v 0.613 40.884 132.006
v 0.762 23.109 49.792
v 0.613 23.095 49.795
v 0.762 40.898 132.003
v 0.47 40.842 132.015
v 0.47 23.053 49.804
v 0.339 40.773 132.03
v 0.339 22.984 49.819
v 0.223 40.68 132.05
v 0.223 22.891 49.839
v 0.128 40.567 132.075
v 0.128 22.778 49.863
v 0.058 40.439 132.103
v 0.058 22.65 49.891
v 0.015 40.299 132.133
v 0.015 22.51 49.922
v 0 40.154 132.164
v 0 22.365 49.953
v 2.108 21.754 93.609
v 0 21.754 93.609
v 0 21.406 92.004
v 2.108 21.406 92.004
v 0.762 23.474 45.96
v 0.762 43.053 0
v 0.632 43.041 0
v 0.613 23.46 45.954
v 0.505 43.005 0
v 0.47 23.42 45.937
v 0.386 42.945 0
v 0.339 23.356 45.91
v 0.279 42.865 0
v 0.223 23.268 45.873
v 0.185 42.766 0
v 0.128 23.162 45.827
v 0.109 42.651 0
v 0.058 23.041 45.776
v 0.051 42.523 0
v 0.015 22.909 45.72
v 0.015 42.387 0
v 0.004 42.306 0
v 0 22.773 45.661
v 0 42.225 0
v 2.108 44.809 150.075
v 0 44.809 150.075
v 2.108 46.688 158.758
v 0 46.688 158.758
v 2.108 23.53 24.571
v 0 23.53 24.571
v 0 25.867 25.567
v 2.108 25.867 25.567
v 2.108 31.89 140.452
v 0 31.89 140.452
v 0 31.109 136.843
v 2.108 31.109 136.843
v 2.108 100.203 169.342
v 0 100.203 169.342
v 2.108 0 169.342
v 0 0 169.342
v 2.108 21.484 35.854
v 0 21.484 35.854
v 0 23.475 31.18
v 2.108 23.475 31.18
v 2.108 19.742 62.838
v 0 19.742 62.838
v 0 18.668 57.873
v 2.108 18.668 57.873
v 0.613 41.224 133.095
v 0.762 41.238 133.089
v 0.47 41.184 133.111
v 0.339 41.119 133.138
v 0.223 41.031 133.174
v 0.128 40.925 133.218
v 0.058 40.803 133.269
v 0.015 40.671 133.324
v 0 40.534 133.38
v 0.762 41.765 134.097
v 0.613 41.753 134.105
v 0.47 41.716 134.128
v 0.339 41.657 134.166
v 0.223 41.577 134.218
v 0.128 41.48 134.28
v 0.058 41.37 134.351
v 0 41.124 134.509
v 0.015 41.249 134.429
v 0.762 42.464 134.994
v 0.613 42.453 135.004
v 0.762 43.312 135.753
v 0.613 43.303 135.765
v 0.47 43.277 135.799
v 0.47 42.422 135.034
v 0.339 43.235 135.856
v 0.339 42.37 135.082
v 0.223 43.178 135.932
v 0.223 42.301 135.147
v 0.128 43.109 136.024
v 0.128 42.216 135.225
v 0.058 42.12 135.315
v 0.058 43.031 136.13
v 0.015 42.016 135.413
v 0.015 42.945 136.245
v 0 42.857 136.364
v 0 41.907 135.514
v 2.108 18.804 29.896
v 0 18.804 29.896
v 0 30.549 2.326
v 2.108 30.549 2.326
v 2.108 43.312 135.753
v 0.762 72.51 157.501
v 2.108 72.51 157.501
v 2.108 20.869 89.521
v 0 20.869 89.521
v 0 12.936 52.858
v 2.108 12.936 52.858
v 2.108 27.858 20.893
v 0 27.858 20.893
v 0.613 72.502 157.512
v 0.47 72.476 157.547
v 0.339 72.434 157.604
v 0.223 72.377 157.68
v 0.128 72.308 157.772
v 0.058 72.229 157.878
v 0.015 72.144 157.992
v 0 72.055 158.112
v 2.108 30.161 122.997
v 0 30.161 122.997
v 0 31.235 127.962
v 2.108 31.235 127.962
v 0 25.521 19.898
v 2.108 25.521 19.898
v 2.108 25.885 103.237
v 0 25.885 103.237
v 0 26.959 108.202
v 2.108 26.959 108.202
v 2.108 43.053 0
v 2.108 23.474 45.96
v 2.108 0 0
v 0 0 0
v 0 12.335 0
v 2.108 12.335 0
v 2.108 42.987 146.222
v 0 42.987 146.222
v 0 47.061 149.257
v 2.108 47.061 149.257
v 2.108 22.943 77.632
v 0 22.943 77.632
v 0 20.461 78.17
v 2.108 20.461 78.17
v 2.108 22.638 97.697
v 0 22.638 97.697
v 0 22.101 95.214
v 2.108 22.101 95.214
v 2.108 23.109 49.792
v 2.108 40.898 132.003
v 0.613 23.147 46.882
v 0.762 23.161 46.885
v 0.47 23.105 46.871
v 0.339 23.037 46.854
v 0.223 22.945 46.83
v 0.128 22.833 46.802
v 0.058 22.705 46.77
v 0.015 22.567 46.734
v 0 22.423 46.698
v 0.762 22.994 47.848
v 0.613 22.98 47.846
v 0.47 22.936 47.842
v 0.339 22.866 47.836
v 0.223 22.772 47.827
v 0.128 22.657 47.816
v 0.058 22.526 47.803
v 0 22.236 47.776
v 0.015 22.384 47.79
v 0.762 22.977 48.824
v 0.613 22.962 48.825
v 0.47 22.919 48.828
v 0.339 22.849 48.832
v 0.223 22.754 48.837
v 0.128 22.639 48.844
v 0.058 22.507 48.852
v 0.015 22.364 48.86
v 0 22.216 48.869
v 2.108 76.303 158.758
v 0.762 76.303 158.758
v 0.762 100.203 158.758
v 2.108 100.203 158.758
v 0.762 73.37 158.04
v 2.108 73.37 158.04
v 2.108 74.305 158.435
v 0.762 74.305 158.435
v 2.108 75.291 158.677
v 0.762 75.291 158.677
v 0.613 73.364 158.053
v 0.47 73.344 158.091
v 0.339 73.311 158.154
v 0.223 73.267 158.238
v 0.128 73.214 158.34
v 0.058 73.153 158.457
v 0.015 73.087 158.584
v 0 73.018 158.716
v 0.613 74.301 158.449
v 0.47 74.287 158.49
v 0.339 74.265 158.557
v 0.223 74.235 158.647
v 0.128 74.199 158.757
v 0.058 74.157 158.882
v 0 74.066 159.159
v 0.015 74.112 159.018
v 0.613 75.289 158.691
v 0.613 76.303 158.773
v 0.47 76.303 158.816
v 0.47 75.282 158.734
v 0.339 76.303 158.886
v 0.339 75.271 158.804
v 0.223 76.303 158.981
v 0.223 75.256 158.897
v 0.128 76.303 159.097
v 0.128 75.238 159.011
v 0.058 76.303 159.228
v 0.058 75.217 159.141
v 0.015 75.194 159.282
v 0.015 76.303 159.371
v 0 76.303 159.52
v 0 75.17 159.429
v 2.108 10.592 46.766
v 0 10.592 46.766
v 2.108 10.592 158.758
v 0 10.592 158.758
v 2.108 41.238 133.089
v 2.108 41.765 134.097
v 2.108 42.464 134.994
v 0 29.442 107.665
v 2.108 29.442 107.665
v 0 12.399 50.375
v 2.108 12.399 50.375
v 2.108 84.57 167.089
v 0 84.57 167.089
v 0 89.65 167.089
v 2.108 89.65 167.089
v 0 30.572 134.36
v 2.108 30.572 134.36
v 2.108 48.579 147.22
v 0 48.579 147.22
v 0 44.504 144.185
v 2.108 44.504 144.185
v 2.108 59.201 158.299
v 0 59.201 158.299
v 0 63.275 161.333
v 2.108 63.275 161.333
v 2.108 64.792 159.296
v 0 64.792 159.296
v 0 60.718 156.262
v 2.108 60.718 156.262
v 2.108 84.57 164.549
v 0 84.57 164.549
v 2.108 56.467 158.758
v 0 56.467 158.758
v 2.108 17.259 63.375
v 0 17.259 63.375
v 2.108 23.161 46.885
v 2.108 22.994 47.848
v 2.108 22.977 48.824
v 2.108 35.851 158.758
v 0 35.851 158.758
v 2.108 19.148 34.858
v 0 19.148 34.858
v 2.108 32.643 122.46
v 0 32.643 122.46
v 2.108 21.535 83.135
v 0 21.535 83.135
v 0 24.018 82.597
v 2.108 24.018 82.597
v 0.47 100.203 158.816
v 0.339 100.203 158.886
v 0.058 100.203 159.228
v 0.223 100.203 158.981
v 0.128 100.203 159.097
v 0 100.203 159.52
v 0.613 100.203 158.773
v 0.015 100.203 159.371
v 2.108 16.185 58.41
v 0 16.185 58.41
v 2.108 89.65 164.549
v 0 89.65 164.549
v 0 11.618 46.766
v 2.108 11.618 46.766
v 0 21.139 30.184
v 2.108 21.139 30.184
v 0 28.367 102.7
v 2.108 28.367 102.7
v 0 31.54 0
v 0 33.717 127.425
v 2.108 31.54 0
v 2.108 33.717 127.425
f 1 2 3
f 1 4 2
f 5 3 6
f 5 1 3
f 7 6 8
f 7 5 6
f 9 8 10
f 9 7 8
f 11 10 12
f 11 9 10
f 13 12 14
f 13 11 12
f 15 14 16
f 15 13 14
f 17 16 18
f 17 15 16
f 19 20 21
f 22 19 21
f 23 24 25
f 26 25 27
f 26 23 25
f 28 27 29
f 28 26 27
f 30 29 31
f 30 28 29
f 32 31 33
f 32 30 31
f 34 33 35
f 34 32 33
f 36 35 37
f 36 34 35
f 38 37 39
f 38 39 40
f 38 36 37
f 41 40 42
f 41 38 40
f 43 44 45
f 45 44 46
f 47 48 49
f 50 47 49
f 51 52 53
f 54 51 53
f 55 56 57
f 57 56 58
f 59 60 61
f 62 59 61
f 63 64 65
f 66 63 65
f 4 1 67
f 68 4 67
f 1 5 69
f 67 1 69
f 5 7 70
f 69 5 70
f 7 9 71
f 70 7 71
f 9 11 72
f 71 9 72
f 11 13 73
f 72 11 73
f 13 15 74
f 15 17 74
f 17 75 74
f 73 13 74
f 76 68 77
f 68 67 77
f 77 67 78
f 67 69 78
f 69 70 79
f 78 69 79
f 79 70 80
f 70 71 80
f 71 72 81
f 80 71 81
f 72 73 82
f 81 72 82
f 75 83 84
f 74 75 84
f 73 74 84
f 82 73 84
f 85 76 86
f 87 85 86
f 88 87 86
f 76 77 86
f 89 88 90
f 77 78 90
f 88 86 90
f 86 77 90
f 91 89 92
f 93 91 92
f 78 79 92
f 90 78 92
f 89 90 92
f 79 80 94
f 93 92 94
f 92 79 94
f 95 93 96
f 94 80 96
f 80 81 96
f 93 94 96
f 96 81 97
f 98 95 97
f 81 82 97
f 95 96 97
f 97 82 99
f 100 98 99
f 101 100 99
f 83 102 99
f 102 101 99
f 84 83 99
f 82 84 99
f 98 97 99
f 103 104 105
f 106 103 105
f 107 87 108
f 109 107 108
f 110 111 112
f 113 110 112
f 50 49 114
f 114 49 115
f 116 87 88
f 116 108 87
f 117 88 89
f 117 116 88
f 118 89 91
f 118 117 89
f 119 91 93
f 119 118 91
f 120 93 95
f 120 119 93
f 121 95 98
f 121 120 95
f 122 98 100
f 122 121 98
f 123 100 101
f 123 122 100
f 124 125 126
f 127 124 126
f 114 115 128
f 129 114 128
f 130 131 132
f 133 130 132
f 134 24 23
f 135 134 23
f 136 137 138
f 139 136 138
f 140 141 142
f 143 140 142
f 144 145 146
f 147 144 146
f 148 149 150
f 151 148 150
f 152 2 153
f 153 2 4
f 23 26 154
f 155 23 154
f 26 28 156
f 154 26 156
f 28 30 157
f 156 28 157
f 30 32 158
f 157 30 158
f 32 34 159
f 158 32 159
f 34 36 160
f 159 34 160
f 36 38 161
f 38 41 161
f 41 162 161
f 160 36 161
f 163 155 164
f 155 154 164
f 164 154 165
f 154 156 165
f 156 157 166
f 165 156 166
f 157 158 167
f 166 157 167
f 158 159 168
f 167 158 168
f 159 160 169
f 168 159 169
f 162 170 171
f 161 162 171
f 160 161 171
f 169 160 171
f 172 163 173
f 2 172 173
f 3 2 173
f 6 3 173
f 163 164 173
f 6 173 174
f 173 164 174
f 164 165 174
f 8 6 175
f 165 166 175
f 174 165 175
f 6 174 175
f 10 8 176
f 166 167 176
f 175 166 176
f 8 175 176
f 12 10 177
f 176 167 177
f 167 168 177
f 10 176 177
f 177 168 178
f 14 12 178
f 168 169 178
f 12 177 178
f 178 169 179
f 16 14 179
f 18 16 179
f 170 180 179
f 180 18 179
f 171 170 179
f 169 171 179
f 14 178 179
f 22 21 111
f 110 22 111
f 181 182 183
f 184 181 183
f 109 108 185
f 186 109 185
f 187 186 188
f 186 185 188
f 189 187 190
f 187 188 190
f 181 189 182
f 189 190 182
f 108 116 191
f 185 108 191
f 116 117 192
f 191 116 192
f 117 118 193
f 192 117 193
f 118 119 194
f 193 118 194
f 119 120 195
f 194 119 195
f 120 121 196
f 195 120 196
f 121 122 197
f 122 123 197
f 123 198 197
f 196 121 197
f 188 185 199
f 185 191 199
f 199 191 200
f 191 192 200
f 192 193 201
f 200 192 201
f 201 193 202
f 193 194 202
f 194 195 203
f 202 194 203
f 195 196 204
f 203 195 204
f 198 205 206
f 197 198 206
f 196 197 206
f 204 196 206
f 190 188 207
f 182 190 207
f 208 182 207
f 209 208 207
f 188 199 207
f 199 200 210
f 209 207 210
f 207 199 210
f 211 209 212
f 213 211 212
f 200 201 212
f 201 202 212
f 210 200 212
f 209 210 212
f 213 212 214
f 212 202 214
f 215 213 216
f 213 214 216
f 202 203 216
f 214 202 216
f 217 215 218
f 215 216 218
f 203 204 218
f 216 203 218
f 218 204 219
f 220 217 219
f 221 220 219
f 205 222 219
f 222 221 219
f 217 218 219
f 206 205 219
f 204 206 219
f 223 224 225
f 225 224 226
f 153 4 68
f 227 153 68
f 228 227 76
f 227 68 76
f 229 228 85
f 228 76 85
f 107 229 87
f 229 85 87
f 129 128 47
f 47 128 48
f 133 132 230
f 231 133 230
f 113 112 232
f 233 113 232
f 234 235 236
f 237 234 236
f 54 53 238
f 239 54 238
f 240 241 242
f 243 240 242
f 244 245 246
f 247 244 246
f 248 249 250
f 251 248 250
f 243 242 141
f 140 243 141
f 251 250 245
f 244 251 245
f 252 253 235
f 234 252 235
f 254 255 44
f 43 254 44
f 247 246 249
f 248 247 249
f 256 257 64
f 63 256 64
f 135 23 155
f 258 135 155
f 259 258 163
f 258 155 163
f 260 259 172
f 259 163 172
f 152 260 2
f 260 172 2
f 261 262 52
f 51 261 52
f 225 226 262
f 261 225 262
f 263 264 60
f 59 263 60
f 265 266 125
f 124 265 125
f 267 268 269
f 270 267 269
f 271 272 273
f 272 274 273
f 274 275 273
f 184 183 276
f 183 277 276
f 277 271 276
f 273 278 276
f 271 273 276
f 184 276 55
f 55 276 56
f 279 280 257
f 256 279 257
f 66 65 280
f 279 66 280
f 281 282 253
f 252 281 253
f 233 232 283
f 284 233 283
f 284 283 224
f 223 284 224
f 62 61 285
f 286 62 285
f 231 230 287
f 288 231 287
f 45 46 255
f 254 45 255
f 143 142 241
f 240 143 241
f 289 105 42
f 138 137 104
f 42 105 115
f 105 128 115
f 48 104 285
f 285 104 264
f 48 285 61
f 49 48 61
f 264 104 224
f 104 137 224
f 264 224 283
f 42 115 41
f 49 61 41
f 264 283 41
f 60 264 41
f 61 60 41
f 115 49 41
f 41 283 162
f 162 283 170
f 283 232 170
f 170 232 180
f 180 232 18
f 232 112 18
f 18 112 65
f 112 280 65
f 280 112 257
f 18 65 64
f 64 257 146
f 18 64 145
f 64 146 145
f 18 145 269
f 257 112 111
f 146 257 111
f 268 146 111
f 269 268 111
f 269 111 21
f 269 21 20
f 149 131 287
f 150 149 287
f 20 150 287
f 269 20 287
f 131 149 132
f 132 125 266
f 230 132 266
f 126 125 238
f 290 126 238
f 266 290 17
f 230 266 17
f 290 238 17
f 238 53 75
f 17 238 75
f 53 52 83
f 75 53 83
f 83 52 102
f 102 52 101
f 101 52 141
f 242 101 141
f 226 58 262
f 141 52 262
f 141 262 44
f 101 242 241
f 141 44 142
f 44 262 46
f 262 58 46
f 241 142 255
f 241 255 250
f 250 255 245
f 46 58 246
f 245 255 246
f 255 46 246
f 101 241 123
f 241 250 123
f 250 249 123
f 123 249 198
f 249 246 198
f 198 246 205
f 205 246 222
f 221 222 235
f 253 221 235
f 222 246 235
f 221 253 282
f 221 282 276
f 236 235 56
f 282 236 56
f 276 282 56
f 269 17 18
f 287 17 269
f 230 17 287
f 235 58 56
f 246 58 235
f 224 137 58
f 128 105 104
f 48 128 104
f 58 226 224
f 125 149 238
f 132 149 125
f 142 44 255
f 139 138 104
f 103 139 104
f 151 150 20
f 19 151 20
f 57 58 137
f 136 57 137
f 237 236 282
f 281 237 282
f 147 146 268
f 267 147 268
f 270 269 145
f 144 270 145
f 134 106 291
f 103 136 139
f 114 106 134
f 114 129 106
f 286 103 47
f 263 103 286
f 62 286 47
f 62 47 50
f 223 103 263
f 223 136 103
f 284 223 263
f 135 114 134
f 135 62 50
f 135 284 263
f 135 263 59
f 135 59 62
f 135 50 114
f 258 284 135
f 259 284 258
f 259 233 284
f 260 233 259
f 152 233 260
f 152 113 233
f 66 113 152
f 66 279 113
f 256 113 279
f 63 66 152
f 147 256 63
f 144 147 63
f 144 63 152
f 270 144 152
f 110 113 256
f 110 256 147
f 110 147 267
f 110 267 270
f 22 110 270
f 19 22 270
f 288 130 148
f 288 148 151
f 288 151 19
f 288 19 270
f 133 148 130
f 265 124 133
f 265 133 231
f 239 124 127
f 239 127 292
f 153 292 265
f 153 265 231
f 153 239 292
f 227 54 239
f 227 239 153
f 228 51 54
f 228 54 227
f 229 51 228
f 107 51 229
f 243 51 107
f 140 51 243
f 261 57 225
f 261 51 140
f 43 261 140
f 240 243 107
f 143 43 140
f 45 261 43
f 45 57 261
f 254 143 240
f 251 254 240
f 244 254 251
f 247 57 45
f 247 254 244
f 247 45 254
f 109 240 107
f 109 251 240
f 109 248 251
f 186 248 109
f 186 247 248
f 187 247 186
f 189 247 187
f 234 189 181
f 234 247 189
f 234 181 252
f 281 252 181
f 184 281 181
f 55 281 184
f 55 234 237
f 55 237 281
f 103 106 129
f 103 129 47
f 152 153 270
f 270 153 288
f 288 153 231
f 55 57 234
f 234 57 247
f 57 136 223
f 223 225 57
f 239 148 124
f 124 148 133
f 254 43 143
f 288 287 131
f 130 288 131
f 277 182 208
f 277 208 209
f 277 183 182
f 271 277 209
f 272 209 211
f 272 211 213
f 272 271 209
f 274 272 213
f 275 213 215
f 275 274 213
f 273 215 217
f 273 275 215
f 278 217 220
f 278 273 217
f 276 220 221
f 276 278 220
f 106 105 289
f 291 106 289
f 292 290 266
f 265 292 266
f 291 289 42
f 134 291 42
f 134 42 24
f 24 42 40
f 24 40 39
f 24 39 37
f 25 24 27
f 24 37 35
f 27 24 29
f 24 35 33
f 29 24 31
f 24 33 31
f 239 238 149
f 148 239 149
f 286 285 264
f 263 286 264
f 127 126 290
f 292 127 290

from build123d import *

# Parameters (mm, degrees)
F0_W     = 5.08
F0_H     = 2.54
F1_DEPTH = 2.1082
F2_R     = 0.762


with BuildPart() as f1:
    # F0 (on Right) → F1 (new body)
    with BuildSketch(Plane.YZ):
        with BuildLine():
            Line((0, 162.0091375), (0, 0))
            Line((0, 0), (12.335197777, 0))
            Line((12.335197777, 0), (18.8042013144, 29.896105485))
            Line((18.8042013144, 29.896105485), (30.5493542935, 2.3257501254))
            Line((30.5493542935, 2.3257501254), (31.5401391658, 0))
            Line((31.5401391658, 0), (31.5707651968, 0))
            Line((31.5707651968, 0), (40.8442968098, 0))
            Line((40.8442968098, 0), (20.5594925834, 47.616175108))
            Line((20.5594925834, 47.616175108), (39.5771112022, 135.5049402038))
            Line((39.5771112022, 135.5049402038), (73.5248959406, 160.7899383022))
            Line((73.5248959406, 160.7899383022), (100.203, 160.7899383022))
            Line((100.203, 160.7899383022), (100.203, 162.0091375))
            Line((100.203, 162.0091375), (82.1398573303, 162.0091375))
            ThreePointArc((82.1398573303, 162.0091375), (80.3438061061, 162.7530862758), (79.5998573303, 164.5491375))
            Line((79.5998573303, 164.5491375), (79.5998573303, 169.3418))
            Line((79.5998573303, 169.3418), (70.6874244764, 169.3418))
            Line((70.6874244764, 169.3418), (70.6874244764, 165.8480664454))
            Line((70.6874244764, 165.8480664454), (70.6874244764, 164.5491375))
            ThreePointArc((70.6874244764, 164.5491375), (70.0510915867, 162.8675752701), (68.4609272063, 162.0285589874))
            ThreePointArc((68.4609272063, 162.0285589874), (68.3044763435, 162.0139975214), (68.1474244764, 162.0091375))
            Line((68.1474244764, 162.0091375), (0, 162.0091375))
        make_face()
        Polygon((21.4843682503, 35.8535070154), (23.4753466245, 31.1799211209), (21.1385536773, 30.1844319338), (19.147575303, 34.8580178283), align=None, mode=Mode.SUBTRACT)
        Polygon((25.8665425285, 25.5668719827), (27.8575209028, 20.8932860882), (25.5207279555, 19.8977969011), (23.5297495813, 24.5713827956), align=None, mode=Mode.SUBTRACT)
        with BuildLine():
            Line((12.3986134924, 50.3752630702), (11.6175919588, 46.7658196656))
            Line((11.6175919588, 46.7658196656), (10.5918, 46.7658196656))
            Line((10.5918, 46.7658196656), (10.5918, 158.7579375))
            Line((10.5918, 158.7579375), (35.8507619547, 158.7579375))
            Line((35.8507619547, 158.7579375), (31.8897708968, 140.4524587956))
            Line((31.8897708968, 140.4524587956), (31.1087493632, 136.8430153909))
            Line((31.1087493632, 136.8430153909), (35.5475592049, 135.882533211))
            ThreePointArc((35.5475592049, 135.882533211), (37.1456481821, 134.7755682604), (37.4929253116, 132.8628062845))
            Line((37.4929253116, 132.8628062845), (29.5595533377, 96.1992113407))
            ThreePointArc((29.5595533377, 96.1992113407), (28.452588387, 94.6011223635), (26.5398264112, 94.2538452339))
            Line((26.5398264112, 94.2538452339), (22.1010165695, 95.2143274138))
            Line((22.1010165695, 95.2143274138), (21.7536814278, 93.6091392306))
            Line((21.7536814278, 93.6091392306), (21.4063462861, 92.0039510473))
            Line((21.4063462861, 92.0039510473), (25.8451561277, 91.0434688674))
            ThreePointArc((25.8451561277, 91.0434688674), (27.4432451049, 89.9365039168), (27.7905222345, 88.0237419409))
            Line((27.7905222345, 88.0237419409), (19.8571502605, 51.3601469971))
            ThreePointArc((19.8571502605, 51.3601469971), (18.7501853099, 49.7620580199), (16.837423334, 49.4147808903))
            Line((16.837423334, 49.4147808903), (12.3986134924, 50.3752630702))
        make_face(mode=Mode.SUBTRACT)
        Polygon((47.0613097153, 149.2568137468), (48.5785484084, 147.2197602993), (44.5044415132, 144.1852829132), (42.9872028202, 146.2223363607), align=None, mode=Mode.SUBTRACT)
        Polygon((44.8088104432, 150.074821282), (46.6876875952, 158.7579375), (56.4668125154, 158.7579375), align=None, mode=Mode.SUBTRACT)
        Polygon((63.2751536106, 161.3332132886), (64.7923923036, 159.296159841), (60.7182854085, 156.2616824549), (59.2010467154, 158.2987359025), align=None, mode=Mode.SUBTRACT)
        with BuildLine():
            Line((0, 164.5491375), (0, 162.0091375))
            Line((0, 162.0091375), (68.1474244764, 162.0091375))
            ThreePointArc((68.1474244764, 162.0091375), (68.3044763435, 162.0139975214), (68.4609272063, 162.0285589874))
            Line((68.4609272063, 162.0285589874), (69.6856973646, 162.9407926238))
            Line((69.6856973646, 162.9407926238), (68.1474244764, 165.0060867035))
            Line((68.1474244764, 165.0060867035), (68.1474244764, 164.5491375))
            Line((68.1474244764, 164.5491375), (55.1748093832, 164.5491375))
            Line((55.1748093832, 164.5491375), (50.0948093832, 164.5491375))
            Line((50.0948093832, 164.5491375), (10.3999171089, 164.5491375))
            Line((10.3999171089, 164.5491375), (5.3199171089, 164.5491375))
            Line((5.3199171089, 164.5491375), (0, 164.5491375))
        make_face()
        Polygon((0, 169.3418), (0, 164.5491375), (5.3199171089, 164.5491375), (5.3199171089, 167.0891375), (10.3999171089, 167.0891375), (10.3999171089, 164.5491375), (50.0948093832, 164.5491375), (50.0948093832, 167.0891375), (55.1748093832, 167.0891375), (55.1748093832, 164.5491375), (68.1474244764, 164.5491375), (68.1474244764, 165.0060867035), (68.1474244764, 169.3418), align=None)
        with Locations((7.8599171089, 165.8191375)):
            Rectangle(F0_W, F0_H)
        with BuildLine():
            Line((69.6856973646, 162.9407926238), (68.4609272063, 162.0285589874))
            ThreePointArc((68.4609272063, 162.0285589874), (70.0510915867, 162.8675752701), (70.6874244764, 164.5491375))
            Line((70.6874244764, 164.5491375), (70.6874244764, 165.8480664454))
            Line((70.6874244764, 165.8480664454), (70.6874244764, 169.3418))
            Line((70.6874244764, 169.3418), (68.1474244764, 169.3418))
            Line((68.1474244764, 169.3418), (68.1474244764, 165.0060867035))
            Line((68.1474244764, 165.0060867035), (69.6856973646, 162.9407926238))
        make_face()
        with Locations((52.6348093832, 165.8191375)):
            Rectangle(F0_W, F0_H)
        with BuildLine():
            Line((20.5594925834, 47.616175108), (40.8442968098, 0))
            Line((40.8442968098, 0), (43.053, 0))
            Line((43.053, 0), (23.4736756901, 45.9601445708))
            ThreePointArc((23.4736756901, 45.9601445708), (22.9941781878, 47.847708452), (23.1092917667, 49.7918185633))
            Line((23.1092917667, 49.7918185633), (40.8984089502, 132.0031391675))
            ThreePointArc((40.8984089502, 132.0031391675), (41.765080018, 134.0967787378), (43.3116785091, 135.7528217618))
            Line((43.3116785091, 135.7528217618), (72.5103326221, 157.500571119))
            ThreePointArc((72.5103326221, 157.500571119), (74.3053957564, 158.4354047741), (76.3034293547, 158.7579375))
            Line((76.3034293547, 158.7579375), (100.203, 158.7579375))
            Line((100.203, 158.7579375), (100.203, 160.7899383022))
            Line((100.203, 160.7899383022), (73.5248959406, 160.7899383022))
            Line((73.5248959406, 160.7899383022), (39.5771112022, 135.5049402038))
            Line((39.5771112022, 135.5049402038), (20.5594925834, 47.616175108))
        make_face()
        with BuildLine():
            Line((82.1398573303, 169.3418), (79.5998573303, 169.3418))
            Line((79.5998573303, 169.3418), (79.5998573303, 164.5491375))
            ThreePointArc((79.5998573303, 164.5491375), (80.3438061061, 162.7530862758), (82.1398573303, 162.0091375))
            Line((82.1398573303, 162.0091375), (100.203, 162.0091375))
            Line((100.203, 162.0091375), (100.203, 164.5491375))
            Line((100.203, 164.5491375), (89.6502663064, 164.5491375))
            Line((89.6502663064, 164.5491375), (84.5702663064, 164.5491375))
            Line((84.5702663064, 164.5491375), (82.1398573303, 164.5491375))
            Line((82.1398573303, 164.5491375), (82.1398573303, 169.3418))
        make_face()
        Polygon((100.203, 169.3418), (82.1398573303, 169.3418), (82.1398573303, 164.5491375), (84.5702663064, 164.5491375), (84.5702663064, 167.0891375), (89.6502663064, 167.0891375), (89.6502663064, 164.5491375), (100.203, 164.5491375), align=None)
        with BuildLine():
            Line((12.9357939022, 52.8578095868), (12.3986134924, 50.3752630702))
            Line((12.3986134924, 50.3752630702), (16.837423334, 49.4147808903))
            ThreePointArc((16.837423334, 49.4147808903), (18.7501853099, 49.7620580199), (19.8571502605, 51.3601469971))
            Line((19.8571502605, 51.3601469971), (27.7905222345, 88.0237419409))
            ThreePointArc((27.7905222345, 88.0237419409), (27.4432451049, 89.9365039168), (25.8451561277, 91.0434688674))
            Line((25.8451561277, 91.0434688674), (21.4063462861, 92.0039510473))
            Line((21.4063462861, 92.0039510473), (20.8691658762, 89.5214045307))
            Line((20.8691658762, 89.5214045307), (25.3079757178, 88.5609223508))
            Line((25.3079757178, 88.5609223508), (24.0175885553, 82.5974767434))
            Line((24.0175885553, 82.5974767434), (22.9432277355, 77.6323837102))
            Line((22.9432277355, 77.6323837102), (19.7419229759, 62.8377489213))
            Line((19.7419229759, 62.8377489213), (18.6675621562, 57.872655888))
            Line((18.6675621562, 57.872655888), (17.3746037439, 51.8973274069))
            Line((17.3746037439, 51.8973274069), (12.9357939022, 52.8578095868))
        make_face()
        Polygon((20.8691658762, 89.5214045307), (12.9357939022, 52.8578095868), (17.3746037439, 51.8973274069), (18.6675621562, 57.872655888), (16.1850156395, 58.4098362979), (17.2593764593, 63.3749293312), (19.7419229759, 62.8377489213), (22.9432277355, 77.6323837102), (20.4606812189, 78.16956412), (21.5350420386, 83.1346571533), (24.0175885553, 82.5974767434), (25.3079757178, 88.5609223508), align=None)
        with BuildLine():
            Line((35.5475592049, 135.882533211), (31.1087493632, 136.8430153909))
            Line((31.1087493632, 136.8430153909), (30.5715689534, 134.3604688743))
            Line((30.5715689534, 134.3604688743), (35.010378795, 133.3999866944))
            Line((35.010378795, 133.3999866944), (33.7174203827, 127.4246582133))
            Line((33.7174203827, 127.4246582133), (32.643059563, 122.45956518))
            Line((32.643059563, 122.45956518), (29.4417548033, 107.6649303911))
            Line((29.4417548033, 107.6649303911), (28.3673939836, 102.6998373579))
            Line((28.3673939836, 102.6998373579), (27.077006821, 96.7363917505))
            Line((27.077006821, 96.7363917505), (22.6381969794, 97.6968739305))
            Line((22.6381969794, 97.6968739305), (22.1010165695, 95.2143274138))
            Line((22.1010165695, 95.2143274138), (26.5398264112, 94.2538452339))
            ThreePointArc((26.5398264112, 94.2538452339), (28.452588387, 94.6011223635), (29.5595533377, 96.1992113407))
            Line((29.5595533377, 96.1992113407), (37.4929253116, 132.8628062845))
            ThreePointArc((37.4929253116, 132.8628062845), (37.1456481821, 134.7755682604), (35.5475592049, 135.882533211))
        make_face()
        Polygon((35.010378795, 133.3999866944), (30.5715689534, 134.3604688743), (22.6381969794, 97.6968739305), (27.077006821, 96.7363917505), (28.3673939836, 102.6998373579), (25.884847467, 103.2370177677), (26.9592082867, 108.202110801), (29.4417548033, 107.6649303911), (32.643059563, 122.45956518), (30.1605130463, 122.9967455899), (31.2348738661, 127.9618386231), (33.7174203827, 127.4246582133), align=None)
    extrude(amount=F1_DEPTH)

    # F2
    f2_edges = [f1.edges().sort_by_distance(p)[0] for p in [
        (0, 57.911006, 146.626696),
        (0, 33.263338, 22.980072),
        (0, 22.994178, 47.847708),
        (0, 32.00385, 90.897479),
        (0, 41.76508, 134.096779),
        (0, 74.305396, 158.435405),
        (0, 88.253215, 158.757937),
    ]]
    fillet(f2_edges, radius=F2_R)


solid = f1.part
